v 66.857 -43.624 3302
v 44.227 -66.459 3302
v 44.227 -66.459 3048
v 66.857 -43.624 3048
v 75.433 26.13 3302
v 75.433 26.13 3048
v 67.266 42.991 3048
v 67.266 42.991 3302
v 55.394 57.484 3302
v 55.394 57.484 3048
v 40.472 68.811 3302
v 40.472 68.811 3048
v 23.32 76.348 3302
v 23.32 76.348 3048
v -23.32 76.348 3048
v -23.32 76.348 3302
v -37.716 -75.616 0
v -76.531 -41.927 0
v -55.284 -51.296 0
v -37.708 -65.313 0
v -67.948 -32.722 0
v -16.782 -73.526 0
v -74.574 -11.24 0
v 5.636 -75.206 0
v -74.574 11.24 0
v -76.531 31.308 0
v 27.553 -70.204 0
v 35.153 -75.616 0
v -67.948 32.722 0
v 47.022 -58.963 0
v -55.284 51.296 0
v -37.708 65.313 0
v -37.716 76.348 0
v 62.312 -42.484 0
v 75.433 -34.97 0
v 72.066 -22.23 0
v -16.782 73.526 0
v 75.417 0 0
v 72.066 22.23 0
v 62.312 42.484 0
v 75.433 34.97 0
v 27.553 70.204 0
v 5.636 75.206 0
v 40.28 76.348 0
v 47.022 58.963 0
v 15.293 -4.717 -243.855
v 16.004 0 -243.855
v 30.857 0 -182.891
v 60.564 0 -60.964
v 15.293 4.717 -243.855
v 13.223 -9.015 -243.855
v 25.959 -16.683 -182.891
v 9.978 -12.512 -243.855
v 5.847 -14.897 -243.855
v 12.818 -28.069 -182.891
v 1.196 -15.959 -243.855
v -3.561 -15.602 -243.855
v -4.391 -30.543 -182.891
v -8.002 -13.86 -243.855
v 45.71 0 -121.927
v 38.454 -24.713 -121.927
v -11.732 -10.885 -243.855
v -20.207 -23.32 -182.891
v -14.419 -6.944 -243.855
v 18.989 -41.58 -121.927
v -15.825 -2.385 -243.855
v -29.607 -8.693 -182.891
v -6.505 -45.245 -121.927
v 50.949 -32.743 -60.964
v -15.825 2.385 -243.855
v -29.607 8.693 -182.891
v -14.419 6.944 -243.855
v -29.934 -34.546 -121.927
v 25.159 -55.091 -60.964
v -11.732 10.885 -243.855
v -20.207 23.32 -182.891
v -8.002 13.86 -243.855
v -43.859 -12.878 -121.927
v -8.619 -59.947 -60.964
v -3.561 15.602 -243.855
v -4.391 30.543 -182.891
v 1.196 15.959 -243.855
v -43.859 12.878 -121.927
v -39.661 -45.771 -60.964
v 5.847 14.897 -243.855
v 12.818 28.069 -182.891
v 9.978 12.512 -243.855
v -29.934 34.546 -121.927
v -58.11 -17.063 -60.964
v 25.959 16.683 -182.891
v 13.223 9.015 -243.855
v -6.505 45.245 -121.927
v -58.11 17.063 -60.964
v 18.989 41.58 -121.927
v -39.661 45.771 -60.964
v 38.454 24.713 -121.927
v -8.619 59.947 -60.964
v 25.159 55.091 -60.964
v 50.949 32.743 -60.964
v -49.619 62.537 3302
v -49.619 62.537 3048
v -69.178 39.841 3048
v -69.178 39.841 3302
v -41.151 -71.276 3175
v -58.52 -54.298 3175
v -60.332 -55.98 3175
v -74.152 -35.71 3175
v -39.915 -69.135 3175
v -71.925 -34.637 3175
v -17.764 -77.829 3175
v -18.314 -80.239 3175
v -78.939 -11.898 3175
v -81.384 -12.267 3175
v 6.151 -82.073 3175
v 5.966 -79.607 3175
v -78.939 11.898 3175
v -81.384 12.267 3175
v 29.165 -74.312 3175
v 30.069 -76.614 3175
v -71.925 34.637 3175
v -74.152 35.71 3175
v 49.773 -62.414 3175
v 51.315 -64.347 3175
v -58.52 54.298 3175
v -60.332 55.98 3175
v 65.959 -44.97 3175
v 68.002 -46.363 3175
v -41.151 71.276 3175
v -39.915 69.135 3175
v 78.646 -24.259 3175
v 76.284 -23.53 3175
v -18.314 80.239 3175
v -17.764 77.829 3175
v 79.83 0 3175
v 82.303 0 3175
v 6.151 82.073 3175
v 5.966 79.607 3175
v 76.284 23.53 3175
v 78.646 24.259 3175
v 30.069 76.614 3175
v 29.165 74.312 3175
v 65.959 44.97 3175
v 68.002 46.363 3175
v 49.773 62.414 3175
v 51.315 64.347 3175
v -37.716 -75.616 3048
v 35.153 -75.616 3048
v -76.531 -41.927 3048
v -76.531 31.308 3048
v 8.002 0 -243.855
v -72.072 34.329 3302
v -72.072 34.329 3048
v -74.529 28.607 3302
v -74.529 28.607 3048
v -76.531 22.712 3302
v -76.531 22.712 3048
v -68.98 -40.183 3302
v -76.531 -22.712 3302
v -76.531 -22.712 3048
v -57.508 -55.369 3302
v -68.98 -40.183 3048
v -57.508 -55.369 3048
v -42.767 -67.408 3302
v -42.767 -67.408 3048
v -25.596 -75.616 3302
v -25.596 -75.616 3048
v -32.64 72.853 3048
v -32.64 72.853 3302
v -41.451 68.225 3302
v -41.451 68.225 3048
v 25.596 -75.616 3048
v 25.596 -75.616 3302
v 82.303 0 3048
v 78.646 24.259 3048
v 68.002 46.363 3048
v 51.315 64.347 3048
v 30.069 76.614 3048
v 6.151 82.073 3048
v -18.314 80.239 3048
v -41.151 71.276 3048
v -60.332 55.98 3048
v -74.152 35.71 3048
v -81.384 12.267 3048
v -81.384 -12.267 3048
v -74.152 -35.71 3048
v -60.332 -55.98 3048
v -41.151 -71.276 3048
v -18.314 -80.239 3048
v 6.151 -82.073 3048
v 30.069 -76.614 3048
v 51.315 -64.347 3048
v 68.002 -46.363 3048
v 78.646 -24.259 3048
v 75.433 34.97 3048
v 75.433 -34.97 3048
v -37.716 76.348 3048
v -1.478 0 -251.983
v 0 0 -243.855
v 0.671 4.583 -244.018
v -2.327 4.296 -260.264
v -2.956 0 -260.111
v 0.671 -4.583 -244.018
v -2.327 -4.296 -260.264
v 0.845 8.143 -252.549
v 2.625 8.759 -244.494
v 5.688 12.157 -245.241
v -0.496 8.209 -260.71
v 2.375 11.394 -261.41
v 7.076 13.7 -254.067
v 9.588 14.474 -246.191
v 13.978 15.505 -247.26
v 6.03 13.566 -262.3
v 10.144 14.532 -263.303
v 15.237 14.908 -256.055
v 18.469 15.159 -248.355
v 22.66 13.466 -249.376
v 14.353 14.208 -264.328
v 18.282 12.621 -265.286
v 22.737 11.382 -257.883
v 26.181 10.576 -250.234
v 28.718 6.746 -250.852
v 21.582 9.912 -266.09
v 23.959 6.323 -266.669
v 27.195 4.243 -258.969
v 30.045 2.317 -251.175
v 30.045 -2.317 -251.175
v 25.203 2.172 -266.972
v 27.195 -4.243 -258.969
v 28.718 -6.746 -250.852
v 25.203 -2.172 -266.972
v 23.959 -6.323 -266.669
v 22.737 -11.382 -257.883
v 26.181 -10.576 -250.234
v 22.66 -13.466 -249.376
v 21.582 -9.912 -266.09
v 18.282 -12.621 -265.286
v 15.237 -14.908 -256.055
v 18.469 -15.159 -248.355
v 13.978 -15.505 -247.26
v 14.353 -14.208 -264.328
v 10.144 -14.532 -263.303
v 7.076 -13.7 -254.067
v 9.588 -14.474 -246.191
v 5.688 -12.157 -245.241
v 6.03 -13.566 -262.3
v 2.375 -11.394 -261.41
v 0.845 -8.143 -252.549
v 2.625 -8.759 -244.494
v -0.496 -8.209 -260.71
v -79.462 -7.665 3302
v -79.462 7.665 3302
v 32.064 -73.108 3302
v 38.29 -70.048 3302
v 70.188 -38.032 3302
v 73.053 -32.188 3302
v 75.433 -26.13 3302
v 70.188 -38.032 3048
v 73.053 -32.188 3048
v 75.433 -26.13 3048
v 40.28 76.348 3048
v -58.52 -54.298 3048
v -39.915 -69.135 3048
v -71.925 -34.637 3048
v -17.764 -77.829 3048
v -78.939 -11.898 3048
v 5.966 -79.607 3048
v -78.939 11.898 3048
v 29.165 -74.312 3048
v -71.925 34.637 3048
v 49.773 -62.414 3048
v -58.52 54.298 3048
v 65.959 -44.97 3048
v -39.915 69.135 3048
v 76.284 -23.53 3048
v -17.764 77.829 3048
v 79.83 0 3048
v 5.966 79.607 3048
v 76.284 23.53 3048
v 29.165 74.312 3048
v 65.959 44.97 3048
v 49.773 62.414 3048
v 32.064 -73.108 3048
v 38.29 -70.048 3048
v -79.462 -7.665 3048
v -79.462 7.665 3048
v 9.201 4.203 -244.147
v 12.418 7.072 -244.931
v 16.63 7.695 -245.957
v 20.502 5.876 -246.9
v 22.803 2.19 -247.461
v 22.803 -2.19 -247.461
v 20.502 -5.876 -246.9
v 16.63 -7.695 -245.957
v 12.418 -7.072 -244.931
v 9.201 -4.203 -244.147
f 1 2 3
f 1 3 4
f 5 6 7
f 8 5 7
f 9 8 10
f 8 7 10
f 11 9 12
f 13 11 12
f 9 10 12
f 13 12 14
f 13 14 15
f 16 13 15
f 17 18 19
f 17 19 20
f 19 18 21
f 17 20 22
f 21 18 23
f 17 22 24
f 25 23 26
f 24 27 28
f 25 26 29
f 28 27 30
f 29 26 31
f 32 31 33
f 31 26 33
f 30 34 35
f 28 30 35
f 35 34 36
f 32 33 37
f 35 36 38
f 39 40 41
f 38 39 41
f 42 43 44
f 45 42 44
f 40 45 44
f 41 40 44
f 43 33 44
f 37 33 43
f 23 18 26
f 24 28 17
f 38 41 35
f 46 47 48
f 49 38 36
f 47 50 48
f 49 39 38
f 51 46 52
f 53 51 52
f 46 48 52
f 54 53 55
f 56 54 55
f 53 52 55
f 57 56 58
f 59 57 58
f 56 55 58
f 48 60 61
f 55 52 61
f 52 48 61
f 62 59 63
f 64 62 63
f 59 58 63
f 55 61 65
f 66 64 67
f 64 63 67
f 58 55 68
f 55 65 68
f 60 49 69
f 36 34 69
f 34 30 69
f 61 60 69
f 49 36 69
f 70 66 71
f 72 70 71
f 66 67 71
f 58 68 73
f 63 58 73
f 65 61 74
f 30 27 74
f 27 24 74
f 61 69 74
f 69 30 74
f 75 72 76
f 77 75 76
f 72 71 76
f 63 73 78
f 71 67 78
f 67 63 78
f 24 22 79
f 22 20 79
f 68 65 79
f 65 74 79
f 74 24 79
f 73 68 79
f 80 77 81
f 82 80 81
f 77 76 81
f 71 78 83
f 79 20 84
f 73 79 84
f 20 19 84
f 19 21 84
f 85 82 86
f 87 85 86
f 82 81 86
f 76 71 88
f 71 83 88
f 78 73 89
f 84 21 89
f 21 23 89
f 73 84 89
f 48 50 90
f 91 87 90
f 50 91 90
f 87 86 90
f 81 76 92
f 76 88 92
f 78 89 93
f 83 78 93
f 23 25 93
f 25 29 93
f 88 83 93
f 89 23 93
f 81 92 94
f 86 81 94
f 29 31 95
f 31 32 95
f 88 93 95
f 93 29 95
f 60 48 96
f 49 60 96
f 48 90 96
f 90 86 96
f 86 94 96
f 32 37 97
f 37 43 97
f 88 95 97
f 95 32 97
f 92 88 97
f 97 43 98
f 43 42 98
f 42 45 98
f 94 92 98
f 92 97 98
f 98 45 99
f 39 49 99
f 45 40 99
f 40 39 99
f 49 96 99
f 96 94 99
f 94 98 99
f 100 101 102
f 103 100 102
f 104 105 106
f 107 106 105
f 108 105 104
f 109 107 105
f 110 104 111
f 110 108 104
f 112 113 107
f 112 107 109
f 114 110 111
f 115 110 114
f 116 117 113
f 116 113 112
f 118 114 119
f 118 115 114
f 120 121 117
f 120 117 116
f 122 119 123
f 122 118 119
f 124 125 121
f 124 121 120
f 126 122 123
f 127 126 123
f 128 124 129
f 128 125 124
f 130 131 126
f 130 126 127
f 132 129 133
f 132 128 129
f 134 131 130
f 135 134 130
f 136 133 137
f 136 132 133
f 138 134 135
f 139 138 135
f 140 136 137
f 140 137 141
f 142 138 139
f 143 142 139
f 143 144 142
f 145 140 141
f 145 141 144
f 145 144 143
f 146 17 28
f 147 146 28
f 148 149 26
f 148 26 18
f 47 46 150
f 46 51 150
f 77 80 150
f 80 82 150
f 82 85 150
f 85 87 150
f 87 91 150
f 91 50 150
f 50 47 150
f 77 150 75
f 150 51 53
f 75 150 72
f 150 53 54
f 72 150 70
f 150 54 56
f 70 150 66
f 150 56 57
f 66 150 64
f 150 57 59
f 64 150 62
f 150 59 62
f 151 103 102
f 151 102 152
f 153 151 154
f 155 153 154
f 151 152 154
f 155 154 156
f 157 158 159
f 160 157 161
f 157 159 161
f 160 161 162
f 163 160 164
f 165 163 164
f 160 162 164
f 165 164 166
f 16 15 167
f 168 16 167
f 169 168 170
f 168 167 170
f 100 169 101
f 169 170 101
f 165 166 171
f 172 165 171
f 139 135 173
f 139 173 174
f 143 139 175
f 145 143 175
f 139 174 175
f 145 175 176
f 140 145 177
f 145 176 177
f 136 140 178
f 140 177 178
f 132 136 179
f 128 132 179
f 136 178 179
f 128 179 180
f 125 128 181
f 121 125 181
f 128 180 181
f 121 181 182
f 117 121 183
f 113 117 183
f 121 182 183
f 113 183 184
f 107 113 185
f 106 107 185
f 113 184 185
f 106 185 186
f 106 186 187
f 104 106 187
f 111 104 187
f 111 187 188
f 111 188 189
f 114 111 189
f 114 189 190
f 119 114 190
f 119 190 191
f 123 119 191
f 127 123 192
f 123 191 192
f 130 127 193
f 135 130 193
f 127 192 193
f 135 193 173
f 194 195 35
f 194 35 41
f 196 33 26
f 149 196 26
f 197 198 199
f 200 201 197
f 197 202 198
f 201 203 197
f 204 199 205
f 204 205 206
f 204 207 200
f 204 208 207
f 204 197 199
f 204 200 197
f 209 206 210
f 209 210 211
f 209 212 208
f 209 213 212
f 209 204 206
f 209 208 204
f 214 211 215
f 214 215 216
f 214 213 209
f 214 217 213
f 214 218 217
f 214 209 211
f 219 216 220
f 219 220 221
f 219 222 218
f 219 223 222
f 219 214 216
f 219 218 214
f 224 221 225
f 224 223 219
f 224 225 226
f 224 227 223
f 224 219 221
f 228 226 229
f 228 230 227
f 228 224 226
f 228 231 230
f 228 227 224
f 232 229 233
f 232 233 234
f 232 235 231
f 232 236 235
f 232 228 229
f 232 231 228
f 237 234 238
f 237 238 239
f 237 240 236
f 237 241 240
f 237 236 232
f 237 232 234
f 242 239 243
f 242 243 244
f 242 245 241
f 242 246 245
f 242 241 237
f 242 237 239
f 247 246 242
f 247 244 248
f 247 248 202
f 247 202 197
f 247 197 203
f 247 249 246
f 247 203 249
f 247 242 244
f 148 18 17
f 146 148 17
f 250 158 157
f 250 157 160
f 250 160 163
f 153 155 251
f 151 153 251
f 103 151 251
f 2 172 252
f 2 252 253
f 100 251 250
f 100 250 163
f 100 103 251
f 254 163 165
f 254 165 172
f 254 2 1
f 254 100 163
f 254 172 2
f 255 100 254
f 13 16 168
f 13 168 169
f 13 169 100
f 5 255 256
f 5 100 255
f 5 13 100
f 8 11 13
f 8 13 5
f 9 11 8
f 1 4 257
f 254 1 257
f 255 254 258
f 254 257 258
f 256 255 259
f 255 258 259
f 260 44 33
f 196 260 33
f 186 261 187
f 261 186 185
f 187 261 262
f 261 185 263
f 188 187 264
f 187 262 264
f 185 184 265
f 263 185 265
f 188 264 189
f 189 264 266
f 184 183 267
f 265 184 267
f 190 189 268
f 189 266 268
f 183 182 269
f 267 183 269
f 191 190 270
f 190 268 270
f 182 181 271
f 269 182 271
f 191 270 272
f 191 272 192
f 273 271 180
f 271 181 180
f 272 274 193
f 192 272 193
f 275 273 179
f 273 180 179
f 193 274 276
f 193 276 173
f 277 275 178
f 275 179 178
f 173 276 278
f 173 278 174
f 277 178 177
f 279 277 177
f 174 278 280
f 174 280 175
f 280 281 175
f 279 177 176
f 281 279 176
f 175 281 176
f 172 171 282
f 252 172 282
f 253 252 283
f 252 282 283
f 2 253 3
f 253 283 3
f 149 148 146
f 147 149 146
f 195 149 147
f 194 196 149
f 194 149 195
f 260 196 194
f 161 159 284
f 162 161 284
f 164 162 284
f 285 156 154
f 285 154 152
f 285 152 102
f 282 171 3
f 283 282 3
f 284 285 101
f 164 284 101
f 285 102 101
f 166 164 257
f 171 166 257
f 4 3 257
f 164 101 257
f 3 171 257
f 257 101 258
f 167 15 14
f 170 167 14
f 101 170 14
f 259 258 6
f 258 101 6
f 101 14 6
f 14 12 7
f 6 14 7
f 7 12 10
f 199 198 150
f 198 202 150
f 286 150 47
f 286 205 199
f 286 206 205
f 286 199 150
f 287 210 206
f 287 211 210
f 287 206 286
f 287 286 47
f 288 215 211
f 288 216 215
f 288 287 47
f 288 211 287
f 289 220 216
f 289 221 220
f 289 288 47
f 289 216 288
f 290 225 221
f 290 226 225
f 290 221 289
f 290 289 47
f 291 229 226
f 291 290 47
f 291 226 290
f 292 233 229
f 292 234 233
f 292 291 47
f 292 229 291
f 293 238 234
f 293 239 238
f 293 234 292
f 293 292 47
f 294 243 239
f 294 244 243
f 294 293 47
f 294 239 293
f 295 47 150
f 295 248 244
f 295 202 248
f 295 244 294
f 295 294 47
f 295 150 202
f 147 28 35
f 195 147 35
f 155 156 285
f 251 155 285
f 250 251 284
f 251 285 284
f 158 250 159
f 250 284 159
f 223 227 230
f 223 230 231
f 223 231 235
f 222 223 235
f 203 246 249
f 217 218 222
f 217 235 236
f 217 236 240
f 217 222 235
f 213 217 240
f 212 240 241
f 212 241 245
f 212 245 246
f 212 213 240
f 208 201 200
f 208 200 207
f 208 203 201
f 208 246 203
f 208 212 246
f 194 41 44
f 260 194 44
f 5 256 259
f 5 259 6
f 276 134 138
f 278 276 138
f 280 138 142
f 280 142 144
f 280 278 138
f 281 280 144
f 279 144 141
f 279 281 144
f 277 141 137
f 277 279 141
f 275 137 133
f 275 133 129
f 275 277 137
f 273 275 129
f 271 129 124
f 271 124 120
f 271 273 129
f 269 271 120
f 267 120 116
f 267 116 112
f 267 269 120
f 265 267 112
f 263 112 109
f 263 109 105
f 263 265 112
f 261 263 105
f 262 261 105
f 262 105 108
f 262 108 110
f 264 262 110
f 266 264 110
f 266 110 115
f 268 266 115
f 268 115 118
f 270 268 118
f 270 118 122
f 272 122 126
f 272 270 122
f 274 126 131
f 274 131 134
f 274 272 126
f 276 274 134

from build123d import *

# Parameters (mm, degrees)
F1_DEPTH = 3048
F2_R     = 82.3029037564
F2_R_2   = 79.8304006239
F3_DEPTH = 127
F4_DEPTH = 254


with BuildPart() as f1:
    # F0 (on Top) → F1 (new body)
    with BuildSketch(Plane.XY):
        Polygon((40.2796342969, 76.3482153416), (-37.7163849771, 76.3482153416), (-76.5313059092, 31.308259815), (-76.5313059092, -41.9274382293), (-37.7163849771, -75.6158605218), (35.1531393826, -75.6158605218), (75.4327774048, -34.9700450897), (75.4327774048, 34.9700450897), align=None)
    extrude(amount=F1_DEPTH)

    # F5 (on Front) → F6 (revolve)
    with BuildSketch(Plane.XZ):
        Polygon((75.4168406129, 0), (0, 0), (0, -243.8547999022), (16.0037322016, -243.8547999022), align=None)
    revolve(axis=Axis((0, 0, -121.9273999511), (0, 0, -1)))

    # F7 (on Front) → F8 (revolve)
    with BuildSketch(Plane.XZ):
        Polygon((16.0037322016, -243.8547999022), (0, -243.8547999022), (-2.9564606287, -260.1110326012), (11.2025477086, -263.560752261), align=None)
    revolve(axis=Axis((13.6031399551, 0, -253.7077760816), (-0.2367167315, 0, -0.9715787096)))


with BuildPart() as f3:
    # F2 (on face) → F3 (new body)
    with BuildSketch(Plane.XY.offset(3048)):
        Circle(F2_R)
        Circle(F2_R_2, mode=Mode.SUBTRACT)
    extrude(amount=F3_DEPTH)


with BuildPart() as f4:
    # F2 (on face) → F4 (new body)
    with BuildSketch(Plane.XY.offset(3048)):
        with BuildLine():
            Line((-76.5313059092, -22.7123772339), (-76.5313059092, 22.7123772339))
            ThreePointArc((-76.5313059092, 22.7123772339), (-79.8304006239, 0), (-76.5313059092, -22.7123772339))
        make_face()
        with BuildLine():
            Line((75.4327774048, -26.1302307065), (75.4327774048, 26.1302307065))
            ThreePointArc((75.4327774048, 26.1302307065), (55.3941417094, 57.483753601), (23.3204390596, 76.3482153416))
            Line((23.3204390596, 76.3482153416), (-23.3204390596, 76.3482153416))
            ThreePointArc((-23.3204390596, 76.3482153416), (-37.1176540566, 70.6765351521), (-49.6187806863, 62.5369448164))
            Line((-49.6187806863, 62.5369448164), (-69.1780500162, 39.8408114843))
            ThreePointArc((-69.1780500162, 39.8408114843), (-73.3563215818, 31.4919505233), (-76.5313059092, 22.7123772339))
            Line((-76.5313059092, 22.7123772339), (-76.5313059092, -22.7123772339))
            ThreePointArc((-76.5313059092, -22.7123772339), (-57.508004888, -55.3689645702), (-25.59559535, -75.6158605218))
            Line((-25.59559535, -75.6158605218), (25.59559535, -75.6158605218))
            ThreePointArc((25.59559535, -75.6158605218), (35.210217735, -71.6458891412), (44.2270263395, -66.4594839353))
            Line((44.2270263395, -66.4594839353), (66.8569977163, -43.6237861738))
            ThreePointArc((66.8569977163, -43.6237861738), (71.6805492914, -35.1396032569), (75.4327774048, -26.1302307065))
        make_face()
    extrude(amount=F4_DEPTH)


solid = Compound([f1.part, f3.part, f4.part])
